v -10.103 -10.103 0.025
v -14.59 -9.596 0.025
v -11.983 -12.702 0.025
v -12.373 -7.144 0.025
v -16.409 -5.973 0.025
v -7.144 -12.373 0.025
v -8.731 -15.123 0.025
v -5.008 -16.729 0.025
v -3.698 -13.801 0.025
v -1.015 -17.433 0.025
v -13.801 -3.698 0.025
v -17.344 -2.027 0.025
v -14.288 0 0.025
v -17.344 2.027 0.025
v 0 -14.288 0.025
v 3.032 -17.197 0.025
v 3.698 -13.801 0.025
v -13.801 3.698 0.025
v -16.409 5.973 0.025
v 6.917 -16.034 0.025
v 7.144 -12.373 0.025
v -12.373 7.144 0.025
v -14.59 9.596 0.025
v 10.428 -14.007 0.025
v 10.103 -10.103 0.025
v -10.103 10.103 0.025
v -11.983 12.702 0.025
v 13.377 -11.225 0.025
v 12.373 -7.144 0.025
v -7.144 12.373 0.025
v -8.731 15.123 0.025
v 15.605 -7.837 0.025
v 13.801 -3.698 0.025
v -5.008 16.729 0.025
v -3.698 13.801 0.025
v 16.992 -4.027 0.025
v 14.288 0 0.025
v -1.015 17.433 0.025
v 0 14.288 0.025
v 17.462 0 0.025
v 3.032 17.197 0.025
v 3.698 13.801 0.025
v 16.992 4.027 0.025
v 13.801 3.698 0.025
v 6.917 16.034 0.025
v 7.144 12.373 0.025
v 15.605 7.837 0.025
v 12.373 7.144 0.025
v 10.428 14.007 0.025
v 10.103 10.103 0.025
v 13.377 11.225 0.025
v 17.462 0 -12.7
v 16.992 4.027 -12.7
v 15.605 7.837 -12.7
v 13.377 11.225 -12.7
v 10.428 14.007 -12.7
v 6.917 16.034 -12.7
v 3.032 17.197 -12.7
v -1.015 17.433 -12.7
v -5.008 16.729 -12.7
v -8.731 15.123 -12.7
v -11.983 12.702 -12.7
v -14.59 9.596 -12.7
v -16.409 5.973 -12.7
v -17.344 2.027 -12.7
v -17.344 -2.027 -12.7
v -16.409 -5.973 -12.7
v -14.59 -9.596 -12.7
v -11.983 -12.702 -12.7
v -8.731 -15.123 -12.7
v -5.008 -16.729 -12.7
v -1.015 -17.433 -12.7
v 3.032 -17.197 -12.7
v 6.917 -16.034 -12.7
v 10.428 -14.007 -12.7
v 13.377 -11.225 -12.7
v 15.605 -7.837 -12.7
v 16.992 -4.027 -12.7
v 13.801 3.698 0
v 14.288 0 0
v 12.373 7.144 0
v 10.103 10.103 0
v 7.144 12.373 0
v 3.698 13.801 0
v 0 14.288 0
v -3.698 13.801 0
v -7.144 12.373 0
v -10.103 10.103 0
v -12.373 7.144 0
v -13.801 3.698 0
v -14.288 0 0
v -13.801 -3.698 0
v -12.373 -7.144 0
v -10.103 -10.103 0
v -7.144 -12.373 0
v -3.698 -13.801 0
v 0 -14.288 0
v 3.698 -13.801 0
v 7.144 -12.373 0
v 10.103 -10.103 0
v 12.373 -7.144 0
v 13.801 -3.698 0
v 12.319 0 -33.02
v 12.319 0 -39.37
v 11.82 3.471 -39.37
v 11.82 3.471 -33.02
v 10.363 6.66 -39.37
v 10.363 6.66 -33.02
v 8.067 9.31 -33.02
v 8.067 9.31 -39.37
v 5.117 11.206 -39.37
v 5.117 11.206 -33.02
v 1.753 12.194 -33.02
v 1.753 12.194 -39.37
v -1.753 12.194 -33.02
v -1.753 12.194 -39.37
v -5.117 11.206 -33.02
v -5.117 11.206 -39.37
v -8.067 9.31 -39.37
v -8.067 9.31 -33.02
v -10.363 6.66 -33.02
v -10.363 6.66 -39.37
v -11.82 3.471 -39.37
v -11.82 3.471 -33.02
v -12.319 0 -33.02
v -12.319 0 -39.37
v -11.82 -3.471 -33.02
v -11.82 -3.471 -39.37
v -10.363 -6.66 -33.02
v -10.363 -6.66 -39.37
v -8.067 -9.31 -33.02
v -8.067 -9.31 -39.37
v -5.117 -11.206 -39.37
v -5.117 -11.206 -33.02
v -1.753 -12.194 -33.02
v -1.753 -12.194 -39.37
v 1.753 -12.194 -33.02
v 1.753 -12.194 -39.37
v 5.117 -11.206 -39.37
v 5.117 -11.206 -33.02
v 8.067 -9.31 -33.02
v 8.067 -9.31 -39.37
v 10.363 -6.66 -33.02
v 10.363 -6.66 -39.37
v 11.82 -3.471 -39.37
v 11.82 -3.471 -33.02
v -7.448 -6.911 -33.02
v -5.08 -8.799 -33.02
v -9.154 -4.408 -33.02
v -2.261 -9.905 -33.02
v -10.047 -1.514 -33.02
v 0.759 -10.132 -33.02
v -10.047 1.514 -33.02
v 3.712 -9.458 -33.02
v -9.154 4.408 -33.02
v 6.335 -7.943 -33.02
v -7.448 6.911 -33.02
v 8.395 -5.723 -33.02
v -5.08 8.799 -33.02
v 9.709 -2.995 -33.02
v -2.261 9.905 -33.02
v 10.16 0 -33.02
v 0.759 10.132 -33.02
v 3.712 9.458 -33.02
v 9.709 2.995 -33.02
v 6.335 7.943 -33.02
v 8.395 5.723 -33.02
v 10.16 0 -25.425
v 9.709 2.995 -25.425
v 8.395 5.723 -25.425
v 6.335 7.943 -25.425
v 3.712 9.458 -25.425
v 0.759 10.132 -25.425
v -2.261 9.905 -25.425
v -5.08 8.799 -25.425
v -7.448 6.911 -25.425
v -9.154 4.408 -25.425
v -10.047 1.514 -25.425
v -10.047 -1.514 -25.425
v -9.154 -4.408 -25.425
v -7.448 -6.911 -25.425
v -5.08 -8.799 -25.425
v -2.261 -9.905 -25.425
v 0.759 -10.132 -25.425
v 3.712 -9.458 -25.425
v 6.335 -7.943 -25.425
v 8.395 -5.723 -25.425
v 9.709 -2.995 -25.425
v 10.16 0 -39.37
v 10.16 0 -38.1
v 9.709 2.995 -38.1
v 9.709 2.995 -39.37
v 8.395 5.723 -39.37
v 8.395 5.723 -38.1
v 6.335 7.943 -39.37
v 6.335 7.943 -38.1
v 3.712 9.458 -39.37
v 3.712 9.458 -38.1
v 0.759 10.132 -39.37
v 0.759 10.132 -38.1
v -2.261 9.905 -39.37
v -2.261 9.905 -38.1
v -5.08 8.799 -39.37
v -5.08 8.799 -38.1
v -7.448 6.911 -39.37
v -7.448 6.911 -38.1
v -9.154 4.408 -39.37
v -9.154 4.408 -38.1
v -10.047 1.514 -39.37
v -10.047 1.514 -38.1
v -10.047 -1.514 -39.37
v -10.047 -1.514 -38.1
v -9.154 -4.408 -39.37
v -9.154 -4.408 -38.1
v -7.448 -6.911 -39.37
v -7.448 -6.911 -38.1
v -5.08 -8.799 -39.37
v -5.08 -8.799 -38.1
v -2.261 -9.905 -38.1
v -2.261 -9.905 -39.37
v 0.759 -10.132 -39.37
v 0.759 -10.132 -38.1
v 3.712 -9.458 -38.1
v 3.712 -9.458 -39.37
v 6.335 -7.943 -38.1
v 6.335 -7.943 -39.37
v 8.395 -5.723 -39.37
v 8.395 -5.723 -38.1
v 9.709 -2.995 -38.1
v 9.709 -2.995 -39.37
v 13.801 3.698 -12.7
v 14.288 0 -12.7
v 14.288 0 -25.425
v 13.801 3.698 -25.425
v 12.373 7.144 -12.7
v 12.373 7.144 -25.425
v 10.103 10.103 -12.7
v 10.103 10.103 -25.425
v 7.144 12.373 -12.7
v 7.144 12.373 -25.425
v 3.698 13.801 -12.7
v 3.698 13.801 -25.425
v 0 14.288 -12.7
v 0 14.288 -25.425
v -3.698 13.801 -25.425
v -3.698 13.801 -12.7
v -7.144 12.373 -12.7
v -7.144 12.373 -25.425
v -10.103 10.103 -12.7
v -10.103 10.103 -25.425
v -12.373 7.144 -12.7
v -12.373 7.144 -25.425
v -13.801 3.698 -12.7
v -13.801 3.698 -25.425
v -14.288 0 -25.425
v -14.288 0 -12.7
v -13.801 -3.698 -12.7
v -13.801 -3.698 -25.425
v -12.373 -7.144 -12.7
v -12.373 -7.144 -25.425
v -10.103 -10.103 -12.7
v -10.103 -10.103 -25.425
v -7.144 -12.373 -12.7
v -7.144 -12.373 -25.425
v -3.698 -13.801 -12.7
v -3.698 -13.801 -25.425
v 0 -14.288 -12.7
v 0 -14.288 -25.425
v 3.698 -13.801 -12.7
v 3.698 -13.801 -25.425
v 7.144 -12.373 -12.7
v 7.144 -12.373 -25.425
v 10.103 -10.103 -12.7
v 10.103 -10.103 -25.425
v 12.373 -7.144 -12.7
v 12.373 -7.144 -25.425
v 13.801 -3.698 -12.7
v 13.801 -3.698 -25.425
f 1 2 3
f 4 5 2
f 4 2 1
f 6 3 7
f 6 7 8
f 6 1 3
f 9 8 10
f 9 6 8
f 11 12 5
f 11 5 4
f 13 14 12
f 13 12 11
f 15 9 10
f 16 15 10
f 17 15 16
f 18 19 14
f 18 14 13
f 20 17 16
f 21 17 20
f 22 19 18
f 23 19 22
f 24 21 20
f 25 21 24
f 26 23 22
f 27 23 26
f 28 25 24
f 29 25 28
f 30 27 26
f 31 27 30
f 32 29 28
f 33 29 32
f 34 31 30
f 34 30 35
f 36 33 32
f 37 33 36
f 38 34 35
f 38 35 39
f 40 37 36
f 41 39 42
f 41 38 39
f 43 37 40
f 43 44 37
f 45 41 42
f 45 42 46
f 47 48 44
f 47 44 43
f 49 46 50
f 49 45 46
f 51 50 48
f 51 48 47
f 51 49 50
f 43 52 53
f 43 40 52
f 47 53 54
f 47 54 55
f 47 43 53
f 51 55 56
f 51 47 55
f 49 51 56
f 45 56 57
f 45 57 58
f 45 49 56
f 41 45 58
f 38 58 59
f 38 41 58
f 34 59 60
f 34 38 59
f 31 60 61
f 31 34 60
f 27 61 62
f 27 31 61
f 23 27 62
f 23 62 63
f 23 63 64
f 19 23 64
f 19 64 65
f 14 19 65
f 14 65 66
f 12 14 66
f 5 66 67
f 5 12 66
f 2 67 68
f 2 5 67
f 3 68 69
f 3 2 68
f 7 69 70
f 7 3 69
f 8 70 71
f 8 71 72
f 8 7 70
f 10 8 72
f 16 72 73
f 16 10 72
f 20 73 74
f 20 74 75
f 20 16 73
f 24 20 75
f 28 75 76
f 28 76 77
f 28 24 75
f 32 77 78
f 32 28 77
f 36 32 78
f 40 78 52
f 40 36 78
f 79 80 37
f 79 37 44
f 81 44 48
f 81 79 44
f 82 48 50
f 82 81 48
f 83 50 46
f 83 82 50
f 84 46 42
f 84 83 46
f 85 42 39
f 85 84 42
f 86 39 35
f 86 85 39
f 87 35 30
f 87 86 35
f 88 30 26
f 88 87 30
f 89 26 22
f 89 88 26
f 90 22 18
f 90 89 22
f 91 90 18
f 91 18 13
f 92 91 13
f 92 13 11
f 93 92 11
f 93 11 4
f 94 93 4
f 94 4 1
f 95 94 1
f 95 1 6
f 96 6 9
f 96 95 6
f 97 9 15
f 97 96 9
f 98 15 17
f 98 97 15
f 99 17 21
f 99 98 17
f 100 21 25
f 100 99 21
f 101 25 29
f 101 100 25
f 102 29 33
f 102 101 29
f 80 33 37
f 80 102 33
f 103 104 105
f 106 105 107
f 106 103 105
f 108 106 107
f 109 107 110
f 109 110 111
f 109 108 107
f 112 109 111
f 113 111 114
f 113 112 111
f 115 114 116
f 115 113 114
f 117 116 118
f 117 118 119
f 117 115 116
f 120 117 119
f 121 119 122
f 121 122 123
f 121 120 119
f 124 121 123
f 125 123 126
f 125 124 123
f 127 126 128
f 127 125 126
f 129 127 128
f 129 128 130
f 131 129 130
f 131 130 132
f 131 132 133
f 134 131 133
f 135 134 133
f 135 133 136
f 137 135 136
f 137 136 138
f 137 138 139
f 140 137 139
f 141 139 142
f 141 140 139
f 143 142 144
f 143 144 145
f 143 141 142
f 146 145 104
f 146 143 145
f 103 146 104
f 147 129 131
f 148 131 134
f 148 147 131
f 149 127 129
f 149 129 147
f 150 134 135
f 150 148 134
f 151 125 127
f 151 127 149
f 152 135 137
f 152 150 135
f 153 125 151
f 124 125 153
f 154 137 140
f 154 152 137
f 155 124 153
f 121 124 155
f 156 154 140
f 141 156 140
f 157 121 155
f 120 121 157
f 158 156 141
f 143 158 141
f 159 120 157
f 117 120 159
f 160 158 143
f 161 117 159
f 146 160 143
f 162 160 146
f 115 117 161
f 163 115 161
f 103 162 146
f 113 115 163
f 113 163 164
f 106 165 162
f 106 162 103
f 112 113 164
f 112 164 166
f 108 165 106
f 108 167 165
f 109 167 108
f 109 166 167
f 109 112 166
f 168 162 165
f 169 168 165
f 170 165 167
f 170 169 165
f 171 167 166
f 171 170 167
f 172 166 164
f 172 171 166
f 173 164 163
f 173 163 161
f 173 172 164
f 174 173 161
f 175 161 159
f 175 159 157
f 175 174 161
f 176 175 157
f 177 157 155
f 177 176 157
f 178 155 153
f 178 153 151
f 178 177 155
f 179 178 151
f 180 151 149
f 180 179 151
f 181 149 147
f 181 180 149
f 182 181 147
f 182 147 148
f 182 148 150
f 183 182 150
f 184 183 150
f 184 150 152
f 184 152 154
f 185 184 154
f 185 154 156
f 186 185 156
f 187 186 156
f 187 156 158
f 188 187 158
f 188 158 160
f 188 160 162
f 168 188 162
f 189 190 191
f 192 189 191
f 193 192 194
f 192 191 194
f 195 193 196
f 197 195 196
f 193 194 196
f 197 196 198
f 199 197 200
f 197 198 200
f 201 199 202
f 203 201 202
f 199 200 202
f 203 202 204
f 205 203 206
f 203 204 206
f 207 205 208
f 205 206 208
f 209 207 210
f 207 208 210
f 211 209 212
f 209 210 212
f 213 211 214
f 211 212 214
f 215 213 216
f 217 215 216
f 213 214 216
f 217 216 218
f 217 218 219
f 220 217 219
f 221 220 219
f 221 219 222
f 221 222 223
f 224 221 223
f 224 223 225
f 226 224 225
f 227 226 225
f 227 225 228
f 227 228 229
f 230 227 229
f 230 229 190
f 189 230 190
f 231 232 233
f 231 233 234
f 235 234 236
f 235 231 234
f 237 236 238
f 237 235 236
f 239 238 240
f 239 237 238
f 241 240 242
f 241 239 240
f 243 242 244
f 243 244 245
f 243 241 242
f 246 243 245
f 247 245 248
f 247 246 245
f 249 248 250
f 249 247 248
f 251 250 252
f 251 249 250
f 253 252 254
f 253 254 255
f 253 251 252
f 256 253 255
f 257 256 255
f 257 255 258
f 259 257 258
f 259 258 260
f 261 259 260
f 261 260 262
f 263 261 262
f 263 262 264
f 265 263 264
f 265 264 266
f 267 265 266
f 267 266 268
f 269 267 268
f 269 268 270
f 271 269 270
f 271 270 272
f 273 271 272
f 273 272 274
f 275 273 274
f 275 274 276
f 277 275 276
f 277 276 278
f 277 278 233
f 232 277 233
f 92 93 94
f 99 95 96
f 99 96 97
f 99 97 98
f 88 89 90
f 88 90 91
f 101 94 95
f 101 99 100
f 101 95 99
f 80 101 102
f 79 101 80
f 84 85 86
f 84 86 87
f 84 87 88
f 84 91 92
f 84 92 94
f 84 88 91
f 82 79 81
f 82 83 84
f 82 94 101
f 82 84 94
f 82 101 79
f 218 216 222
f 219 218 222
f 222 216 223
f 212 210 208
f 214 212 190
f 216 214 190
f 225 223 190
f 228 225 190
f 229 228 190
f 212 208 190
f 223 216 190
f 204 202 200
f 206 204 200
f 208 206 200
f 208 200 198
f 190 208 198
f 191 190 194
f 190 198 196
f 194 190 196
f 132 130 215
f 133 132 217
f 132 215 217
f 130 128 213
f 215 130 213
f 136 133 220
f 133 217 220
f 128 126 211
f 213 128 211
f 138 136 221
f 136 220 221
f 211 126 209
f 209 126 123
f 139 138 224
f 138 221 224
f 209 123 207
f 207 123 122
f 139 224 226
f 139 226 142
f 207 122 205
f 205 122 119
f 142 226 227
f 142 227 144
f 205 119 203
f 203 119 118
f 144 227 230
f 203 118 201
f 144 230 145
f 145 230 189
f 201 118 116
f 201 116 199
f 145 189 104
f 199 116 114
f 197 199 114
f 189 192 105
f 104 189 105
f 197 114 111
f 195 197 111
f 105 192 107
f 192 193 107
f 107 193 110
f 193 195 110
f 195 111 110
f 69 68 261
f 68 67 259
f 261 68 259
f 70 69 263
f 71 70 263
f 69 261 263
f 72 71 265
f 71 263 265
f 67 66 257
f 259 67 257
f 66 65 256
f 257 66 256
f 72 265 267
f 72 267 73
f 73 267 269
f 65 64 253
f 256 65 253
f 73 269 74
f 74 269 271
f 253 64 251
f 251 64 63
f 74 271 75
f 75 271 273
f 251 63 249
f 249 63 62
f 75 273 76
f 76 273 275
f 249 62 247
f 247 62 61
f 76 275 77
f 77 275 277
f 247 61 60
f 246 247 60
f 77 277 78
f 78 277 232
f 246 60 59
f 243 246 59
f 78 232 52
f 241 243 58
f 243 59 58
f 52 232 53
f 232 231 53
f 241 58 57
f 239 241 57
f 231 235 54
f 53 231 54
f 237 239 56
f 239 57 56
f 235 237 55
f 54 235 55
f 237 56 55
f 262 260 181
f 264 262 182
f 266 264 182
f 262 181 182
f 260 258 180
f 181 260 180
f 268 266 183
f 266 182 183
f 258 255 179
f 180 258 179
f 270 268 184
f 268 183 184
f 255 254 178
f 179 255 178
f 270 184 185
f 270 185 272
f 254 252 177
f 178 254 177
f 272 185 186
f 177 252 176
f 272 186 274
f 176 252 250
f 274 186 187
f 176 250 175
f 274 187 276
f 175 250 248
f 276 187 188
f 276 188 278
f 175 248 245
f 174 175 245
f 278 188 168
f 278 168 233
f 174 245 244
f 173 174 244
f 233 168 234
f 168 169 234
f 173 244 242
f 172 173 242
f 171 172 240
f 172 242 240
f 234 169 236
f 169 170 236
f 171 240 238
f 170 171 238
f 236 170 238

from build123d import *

# Parameters (mm, degrees)
F0_R          = 14.2875
F0_R_2        = 12.319
F0_R_3        = 10.16
F1_DEPTH      = 25.4254
F0_R_4        = 17.4625
F2_DEPTH      = 12.7
F2_DEPTH_BACK = 0.0254
F3_START      = -25.4
F3_DEPTH      = 12.7
F4_START      = -33.02
F4_DEPTH      = 6.35


with BuildPart() as f1:
    # F0 (on Top) → F1 (new body)
    with BuildSketch(Plane.XY):
        Circle(F0_R)
        Circle(F0_R_2, mode=Mode.SUBTRACT)
        Circle(F0_R_2)
        Circle(F0_R_3, mode=Mode.SUBTRACT)
        Circle(F0_R_3)
    extrude(amount=-F1_DEPTH)

    # F0 (on Top) → F2 (join, two sides)
    with BuildSketch(Plane.XY) as f2_sk:
        Circle(F0_R_4)
        Circle(F0_R, mode=Mode.SUBTRACT)
    extrude(amount=-F2_DEPTH)
    extrude(f2_sk.sketch, amount=F2_DEPTH_BACK)

    # F0 (on Top) → F3 (join)
    with BuildSketch(Plane.XY.offset(F3_START)):
        Circle(F0_R_3)
    extrude(amount=-F3_DEPTH)

    # F0 (on Top) → F4 (join)
    with BuildSketch(Plane.XY.offset(F4_START)):
        Circle(F0_R_2)
        Circle(F0_R_3, mode=Mode.SUBTRACT)
    extrude(amount=-F4_DEPTH)


solid = f1.part
